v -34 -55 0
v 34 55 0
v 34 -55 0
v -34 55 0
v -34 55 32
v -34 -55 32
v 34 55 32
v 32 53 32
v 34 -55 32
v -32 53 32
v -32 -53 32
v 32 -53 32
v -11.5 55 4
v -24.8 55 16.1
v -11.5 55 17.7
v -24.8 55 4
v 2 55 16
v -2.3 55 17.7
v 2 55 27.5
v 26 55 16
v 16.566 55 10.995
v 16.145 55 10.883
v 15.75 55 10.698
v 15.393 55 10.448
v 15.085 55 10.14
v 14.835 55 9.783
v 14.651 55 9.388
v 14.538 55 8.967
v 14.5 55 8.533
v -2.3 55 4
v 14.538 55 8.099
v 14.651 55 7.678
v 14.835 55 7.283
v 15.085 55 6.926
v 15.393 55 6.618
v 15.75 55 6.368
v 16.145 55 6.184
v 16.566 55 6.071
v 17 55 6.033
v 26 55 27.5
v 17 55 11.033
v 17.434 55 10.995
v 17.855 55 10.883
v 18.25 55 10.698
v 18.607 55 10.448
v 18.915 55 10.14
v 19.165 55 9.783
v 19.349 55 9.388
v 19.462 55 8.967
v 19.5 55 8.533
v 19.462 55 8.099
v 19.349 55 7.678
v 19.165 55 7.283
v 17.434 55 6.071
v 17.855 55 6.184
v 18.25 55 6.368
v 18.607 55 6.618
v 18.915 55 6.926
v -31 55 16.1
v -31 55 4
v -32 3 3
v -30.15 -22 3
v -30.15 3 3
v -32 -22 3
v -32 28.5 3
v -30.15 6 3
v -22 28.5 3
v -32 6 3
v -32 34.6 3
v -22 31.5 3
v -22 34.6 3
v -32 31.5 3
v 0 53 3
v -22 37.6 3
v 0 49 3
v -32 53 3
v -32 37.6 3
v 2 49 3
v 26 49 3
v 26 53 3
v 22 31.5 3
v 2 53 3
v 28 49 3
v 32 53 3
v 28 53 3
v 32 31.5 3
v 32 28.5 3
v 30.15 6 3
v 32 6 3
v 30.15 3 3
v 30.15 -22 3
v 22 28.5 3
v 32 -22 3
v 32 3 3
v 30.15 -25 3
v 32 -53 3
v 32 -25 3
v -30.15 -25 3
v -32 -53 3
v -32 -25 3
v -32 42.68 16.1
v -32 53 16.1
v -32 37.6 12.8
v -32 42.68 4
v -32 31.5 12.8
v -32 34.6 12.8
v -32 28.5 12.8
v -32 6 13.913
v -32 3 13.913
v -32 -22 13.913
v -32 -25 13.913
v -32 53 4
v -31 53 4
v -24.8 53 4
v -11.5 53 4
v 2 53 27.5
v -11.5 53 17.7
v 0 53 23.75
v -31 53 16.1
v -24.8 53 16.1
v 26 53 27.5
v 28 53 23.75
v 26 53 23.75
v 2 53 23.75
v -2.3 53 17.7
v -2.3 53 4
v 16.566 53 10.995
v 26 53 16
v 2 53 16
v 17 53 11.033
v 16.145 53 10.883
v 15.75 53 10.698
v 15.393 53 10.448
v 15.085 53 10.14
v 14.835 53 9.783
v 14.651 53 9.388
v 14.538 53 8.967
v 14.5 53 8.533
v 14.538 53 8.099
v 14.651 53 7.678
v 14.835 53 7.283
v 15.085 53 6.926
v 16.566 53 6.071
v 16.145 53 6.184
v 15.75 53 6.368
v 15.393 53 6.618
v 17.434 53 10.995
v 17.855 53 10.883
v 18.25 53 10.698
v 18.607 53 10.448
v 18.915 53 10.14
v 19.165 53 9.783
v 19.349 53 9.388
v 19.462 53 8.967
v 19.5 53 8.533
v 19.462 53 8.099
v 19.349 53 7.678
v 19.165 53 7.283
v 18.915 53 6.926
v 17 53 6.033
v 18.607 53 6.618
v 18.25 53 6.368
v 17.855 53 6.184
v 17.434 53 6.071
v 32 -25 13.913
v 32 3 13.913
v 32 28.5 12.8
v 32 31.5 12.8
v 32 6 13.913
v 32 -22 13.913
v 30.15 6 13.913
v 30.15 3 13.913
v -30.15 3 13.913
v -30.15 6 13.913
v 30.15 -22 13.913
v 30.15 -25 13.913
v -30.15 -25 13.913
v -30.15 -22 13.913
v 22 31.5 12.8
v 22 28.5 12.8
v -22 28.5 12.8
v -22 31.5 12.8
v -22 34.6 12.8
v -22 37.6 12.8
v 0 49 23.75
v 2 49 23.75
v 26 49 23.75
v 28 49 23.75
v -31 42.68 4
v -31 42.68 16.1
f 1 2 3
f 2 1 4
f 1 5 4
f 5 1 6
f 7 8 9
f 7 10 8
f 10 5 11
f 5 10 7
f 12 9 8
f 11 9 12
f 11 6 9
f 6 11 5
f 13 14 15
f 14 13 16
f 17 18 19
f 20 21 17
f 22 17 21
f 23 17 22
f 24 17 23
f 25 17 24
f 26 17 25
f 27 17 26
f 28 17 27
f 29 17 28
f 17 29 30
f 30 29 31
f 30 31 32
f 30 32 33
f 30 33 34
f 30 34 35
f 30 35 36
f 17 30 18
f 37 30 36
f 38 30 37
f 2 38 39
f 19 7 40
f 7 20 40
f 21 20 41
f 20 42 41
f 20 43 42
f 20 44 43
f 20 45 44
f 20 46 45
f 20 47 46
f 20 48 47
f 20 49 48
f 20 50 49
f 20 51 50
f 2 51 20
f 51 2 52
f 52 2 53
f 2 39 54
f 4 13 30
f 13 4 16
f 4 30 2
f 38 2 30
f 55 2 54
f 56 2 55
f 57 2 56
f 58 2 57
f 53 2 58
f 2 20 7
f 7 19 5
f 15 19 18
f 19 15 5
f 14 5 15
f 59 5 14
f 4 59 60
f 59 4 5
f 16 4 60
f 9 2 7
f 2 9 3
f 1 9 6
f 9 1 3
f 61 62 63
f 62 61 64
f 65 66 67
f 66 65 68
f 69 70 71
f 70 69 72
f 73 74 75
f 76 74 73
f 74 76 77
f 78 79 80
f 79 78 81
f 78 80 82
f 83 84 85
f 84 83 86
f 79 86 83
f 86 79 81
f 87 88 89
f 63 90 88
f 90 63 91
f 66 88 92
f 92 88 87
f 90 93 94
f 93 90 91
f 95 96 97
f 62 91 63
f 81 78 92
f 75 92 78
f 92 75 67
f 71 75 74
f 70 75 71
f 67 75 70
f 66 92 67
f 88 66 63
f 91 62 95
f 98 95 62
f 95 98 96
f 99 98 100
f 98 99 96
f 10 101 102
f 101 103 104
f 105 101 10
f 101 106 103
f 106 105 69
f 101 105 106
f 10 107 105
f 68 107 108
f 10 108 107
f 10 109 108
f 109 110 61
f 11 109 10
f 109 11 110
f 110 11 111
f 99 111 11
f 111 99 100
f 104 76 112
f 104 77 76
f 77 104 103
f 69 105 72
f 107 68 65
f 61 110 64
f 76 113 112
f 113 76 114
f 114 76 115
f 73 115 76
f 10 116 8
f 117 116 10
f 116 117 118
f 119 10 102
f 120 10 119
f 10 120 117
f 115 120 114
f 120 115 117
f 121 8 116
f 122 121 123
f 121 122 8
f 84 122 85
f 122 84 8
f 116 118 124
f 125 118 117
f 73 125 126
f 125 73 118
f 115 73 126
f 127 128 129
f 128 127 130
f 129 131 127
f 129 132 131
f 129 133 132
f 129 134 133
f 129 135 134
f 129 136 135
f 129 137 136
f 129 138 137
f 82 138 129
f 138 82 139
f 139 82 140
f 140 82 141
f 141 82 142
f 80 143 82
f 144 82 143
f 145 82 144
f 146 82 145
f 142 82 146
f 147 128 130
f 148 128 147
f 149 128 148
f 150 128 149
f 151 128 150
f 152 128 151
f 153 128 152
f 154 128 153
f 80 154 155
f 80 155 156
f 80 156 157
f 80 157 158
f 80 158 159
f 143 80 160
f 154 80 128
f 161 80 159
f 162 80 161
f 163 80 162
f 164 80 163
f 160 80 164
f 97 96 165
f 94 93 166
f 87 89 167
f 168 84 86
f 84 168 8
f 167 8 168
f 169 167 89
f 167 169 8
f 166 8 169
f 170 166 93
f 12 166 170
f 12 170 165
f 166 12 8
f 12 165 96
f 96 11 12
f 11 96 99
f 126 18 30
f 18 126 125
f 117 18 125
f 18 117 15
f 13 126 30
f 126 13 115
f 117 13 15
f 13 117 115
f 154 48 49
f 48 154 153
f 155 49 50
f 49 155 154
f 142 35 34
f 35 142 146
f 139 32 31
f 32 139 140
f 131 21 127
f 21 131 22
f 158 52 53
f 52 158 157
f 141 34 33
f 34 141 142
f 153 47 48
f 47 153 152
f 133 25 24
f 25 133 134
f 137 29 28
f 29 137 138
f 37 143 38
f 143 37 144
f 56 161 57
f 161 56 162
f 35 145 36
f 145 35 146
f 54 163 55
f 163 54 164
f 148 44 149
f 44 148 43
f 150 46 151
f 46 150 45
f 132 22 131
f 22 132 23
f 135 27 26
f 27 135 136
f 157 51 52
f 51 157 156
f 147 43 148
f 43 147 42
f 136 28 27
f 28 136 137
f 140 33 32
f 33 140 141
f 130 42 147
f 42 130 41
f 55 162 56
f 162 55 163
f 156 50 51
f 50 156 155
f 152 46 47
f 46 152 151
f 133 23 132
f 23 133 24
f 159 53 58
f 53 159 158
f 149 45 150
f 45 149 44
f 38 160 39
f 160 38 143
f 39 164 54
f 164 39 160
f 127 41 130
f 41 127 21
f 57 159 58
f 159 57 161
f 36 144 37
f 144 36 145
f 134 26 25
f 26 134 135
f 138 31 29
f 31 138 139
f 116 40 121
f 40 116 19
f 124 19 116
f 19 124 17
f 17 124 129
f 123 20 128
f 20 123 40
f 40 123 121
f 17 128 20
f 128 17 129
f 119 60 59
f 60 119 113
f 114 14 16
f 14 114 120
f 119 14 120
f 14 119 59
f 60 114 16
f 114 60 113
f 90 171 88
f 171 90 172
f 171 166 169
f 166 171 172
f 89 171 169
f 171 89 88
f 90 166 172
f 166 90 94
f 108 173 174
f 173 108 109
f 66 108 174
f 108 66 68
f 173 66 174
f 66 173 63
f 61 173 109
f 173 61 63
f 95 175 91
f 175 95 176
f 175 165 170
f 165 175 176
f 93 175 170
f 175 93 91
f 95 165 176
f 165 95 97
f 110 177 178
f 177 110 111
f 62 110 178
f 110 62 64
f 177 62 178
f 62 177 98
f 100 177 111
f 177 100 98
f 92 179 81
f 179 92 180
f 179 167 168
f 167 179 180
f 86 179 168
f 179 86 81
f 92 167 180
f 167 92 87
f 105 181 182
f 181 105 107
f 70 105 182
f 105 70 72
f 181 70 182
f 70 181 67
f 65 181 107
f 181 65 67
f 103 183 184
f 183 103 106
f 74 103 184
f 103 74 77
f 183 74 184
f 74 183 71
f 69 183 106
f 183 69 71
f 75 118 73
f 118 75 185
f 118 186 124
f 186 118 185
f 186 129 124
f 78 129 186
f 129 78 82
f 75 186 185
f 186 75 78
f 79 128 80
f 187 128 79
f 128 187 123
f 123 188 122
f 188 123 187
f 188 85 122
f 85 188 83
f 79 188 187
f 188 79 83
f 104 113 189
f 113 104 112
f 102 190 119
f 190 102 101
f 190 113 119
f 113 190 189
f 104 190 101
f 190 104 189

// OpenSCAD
// file: vars.scad
echo(version=version());
//All dimensions are in mm


batteryHolder3s=[68,110.0];
batteryHolder2s=[50,106.0];
h=32;    // height of box without lid
wall=2;  // wall thickness
postloc=28; // where the edge posts are in y direction
postsize=[1.85,3] ;  //Dimension of posts in x and y
basethickness=3;
holdslotloc=81.5;
holdslotwidth=10;
wireholddiameter = 5.0;
switchcutout = [13.7, 9.2];
switchDepth = 16.0;
//Perforation size: 23mm*10.5mm
voltMeterCutout=[24,11.5];
// Allow for slip by making the ridge a little smaller than the box it fits into.
interference=0.8;
Usb15=[17.2,12.1];
usbCPortStandoff=2.0;
usbConnector=[10,7.0,4.2];
circuitBoardThick=2.0;

Usb15Package=[Usb15.x+usbCPortStandoff, Usb15.y,circuitBoardThick+usbConnector.z];
// main file
include <vars.scad>;
// simple 2D -> 3D extrusion of a rectangle
color("red")
   difference() {
        linear_extrude(height = h)
            square(batteryHolder3s, center = true);
       translate ([0,0,basethickness])
         linear_extrude(height = h)
            square([batteryHolder3s.x-2*wall, batteryHolder3s.y-2*wall
            ], center = true)   ;
            //  Hole for the small switch
      translate([-batteryHolder3s.x/4+wireholddiameter/2+3,batteryHolder3s.y/2+1,switchcutout.x+2*wall])
      rotate([90,90,0])
          linear_extrude(height = 5)
              square(switchcutout, center = false);
// Hole for the wires
      translate([+batteryHolder3s.x/4,batteryHolder3s.y/2+1,h/3*.8])
      rotate([90,0,0])
      cylinder(h = wall*5,
              r1 = wireholddiameter/2,
              r2 = wireholddiameter/2,
              $fn = 36,
              center = false);  //Dimension of posts in x and y

// this hole is for a small voltmeter
    smallVoltmeter([2,batteryHolder3s.y/2+2,h/2],[90,0,0]);
     //smallVoltmeter([5,batteryHolder3s.y/2+2,h/2],[90,0,0]);

     // Hole for the USB Charging connector
     usbC15VBoard(size=Usb15Package ,
                    translation=[-batteryHolder3s.x/2+wall+1,
                    batteryHolder3s.y/2-Usb15Package.x+.01,wall+2],
                    rotation=[90,0,90]);


       }
sidepost(batteryHolder3s.x/2-wall-postsize[0],-batteryHolder3s.y/2+wall + 2*postloc);
sidepost(-batteryHolder3s.x/2+wall,-batteryHolder3s.y/2+wall + 2*postloc);
sidepost(batteryHolder3s.x/2-wall-postsize[0],-batteryHolder3s.y/2+wall + postloc);
sidepost(-batteryHolder3s.x/2+wall,-batteryHolder3s.y/2+wall + postloc);


holdslot(  batteryHolder3s.x/2-wall-holdslotwidth,
         -batteryHolder3s.y/2+wall + holdslotloc,
          holdslotwidth);

holdslot(  -batteryHolder3s.x/2+wall,
          -batteryHolder3s.y/2+wall  + holdslotloc,
          holdslotwidth);

holdslot(  -batteryHolder3s.x/2+wall,batteryHolder3s.y/2-Usb15Package.x-1.2,holdslotwidth,postcolor="pink");

// posts for standoff for voltmeter       smallVoltmeter([5,batteryHolder3s.y/2+2,h/2],[90,0,0]);

smallPost(size=[2,6-wall,h/2+voltMeterCutout.y/2-wall+2],
  translation=[0,batteryHolder3s.y/2-6,wall]);
smallPost(size=[2,6-wall,h/2+voltMeterCutout.y/2-wall+2],
  translation=[voltMeterCutout.x+2,batteryHolder3s.y/2-6,wall]);

smallPost(size=[1,Usb15.x*0.6,Usb15Package.y],
  translation=[-batteryHolder3s.x/2+wall,batteryHolder3s.y/2-wall-Usb15.x*0.6,wall+2]);
// For debugging, draw the Usb15Package
//smallPost(size=Usb15Package, translation=[-batteryHolder3s.x/2+wall, batteryHolder3s.y/2-Usb15Package.x, wall], rotation=[90,0,90]);

module sidepost(x=0,y=0, postcolor="blue") {
   color(postcolor)
    translate ([x,y,basethickness])

        linear_extrude(height = h/2.3-basethickness)
            square(postsize, center = false);
}

module smallVoltmeter(translation=[0,0,0], rotation=[0,0,0], color="green")
{
  color(color)
  translate(translation)
  rotate(rotation)
      linear_extrude(height = 5)
          square(voltMeterCutout,
          center = false);
}

module usbC15VBoard(size=[0,0,0],translation=[0,0,0], rotation=[0,0,0], color="lightblue")
{
  color(color)
  translate(translation)
  rotate(rotation)
      linear_extrude(height = size.z)
          square([size.x,size.y],
          center = false);

}
module holdslot(x=0,y=0, width=10, postcolor="yellow") {
   color(postcolor)
    translate ([x,y,basethickness])

        linear_extrude(height = h/2.5-basethickness)
            square([width, 3
            ], center = false);
}

// generic module for making a square post
module smallPost(size=[0,0,0],translation=[0,0,0], rotation=[0,0,0], color="blue") {
   color(color)
    translate (translation)
    rotate(rotation)
    linear_extrude(height = size.z)
            square([size.x,size.y ], center = false);
}
